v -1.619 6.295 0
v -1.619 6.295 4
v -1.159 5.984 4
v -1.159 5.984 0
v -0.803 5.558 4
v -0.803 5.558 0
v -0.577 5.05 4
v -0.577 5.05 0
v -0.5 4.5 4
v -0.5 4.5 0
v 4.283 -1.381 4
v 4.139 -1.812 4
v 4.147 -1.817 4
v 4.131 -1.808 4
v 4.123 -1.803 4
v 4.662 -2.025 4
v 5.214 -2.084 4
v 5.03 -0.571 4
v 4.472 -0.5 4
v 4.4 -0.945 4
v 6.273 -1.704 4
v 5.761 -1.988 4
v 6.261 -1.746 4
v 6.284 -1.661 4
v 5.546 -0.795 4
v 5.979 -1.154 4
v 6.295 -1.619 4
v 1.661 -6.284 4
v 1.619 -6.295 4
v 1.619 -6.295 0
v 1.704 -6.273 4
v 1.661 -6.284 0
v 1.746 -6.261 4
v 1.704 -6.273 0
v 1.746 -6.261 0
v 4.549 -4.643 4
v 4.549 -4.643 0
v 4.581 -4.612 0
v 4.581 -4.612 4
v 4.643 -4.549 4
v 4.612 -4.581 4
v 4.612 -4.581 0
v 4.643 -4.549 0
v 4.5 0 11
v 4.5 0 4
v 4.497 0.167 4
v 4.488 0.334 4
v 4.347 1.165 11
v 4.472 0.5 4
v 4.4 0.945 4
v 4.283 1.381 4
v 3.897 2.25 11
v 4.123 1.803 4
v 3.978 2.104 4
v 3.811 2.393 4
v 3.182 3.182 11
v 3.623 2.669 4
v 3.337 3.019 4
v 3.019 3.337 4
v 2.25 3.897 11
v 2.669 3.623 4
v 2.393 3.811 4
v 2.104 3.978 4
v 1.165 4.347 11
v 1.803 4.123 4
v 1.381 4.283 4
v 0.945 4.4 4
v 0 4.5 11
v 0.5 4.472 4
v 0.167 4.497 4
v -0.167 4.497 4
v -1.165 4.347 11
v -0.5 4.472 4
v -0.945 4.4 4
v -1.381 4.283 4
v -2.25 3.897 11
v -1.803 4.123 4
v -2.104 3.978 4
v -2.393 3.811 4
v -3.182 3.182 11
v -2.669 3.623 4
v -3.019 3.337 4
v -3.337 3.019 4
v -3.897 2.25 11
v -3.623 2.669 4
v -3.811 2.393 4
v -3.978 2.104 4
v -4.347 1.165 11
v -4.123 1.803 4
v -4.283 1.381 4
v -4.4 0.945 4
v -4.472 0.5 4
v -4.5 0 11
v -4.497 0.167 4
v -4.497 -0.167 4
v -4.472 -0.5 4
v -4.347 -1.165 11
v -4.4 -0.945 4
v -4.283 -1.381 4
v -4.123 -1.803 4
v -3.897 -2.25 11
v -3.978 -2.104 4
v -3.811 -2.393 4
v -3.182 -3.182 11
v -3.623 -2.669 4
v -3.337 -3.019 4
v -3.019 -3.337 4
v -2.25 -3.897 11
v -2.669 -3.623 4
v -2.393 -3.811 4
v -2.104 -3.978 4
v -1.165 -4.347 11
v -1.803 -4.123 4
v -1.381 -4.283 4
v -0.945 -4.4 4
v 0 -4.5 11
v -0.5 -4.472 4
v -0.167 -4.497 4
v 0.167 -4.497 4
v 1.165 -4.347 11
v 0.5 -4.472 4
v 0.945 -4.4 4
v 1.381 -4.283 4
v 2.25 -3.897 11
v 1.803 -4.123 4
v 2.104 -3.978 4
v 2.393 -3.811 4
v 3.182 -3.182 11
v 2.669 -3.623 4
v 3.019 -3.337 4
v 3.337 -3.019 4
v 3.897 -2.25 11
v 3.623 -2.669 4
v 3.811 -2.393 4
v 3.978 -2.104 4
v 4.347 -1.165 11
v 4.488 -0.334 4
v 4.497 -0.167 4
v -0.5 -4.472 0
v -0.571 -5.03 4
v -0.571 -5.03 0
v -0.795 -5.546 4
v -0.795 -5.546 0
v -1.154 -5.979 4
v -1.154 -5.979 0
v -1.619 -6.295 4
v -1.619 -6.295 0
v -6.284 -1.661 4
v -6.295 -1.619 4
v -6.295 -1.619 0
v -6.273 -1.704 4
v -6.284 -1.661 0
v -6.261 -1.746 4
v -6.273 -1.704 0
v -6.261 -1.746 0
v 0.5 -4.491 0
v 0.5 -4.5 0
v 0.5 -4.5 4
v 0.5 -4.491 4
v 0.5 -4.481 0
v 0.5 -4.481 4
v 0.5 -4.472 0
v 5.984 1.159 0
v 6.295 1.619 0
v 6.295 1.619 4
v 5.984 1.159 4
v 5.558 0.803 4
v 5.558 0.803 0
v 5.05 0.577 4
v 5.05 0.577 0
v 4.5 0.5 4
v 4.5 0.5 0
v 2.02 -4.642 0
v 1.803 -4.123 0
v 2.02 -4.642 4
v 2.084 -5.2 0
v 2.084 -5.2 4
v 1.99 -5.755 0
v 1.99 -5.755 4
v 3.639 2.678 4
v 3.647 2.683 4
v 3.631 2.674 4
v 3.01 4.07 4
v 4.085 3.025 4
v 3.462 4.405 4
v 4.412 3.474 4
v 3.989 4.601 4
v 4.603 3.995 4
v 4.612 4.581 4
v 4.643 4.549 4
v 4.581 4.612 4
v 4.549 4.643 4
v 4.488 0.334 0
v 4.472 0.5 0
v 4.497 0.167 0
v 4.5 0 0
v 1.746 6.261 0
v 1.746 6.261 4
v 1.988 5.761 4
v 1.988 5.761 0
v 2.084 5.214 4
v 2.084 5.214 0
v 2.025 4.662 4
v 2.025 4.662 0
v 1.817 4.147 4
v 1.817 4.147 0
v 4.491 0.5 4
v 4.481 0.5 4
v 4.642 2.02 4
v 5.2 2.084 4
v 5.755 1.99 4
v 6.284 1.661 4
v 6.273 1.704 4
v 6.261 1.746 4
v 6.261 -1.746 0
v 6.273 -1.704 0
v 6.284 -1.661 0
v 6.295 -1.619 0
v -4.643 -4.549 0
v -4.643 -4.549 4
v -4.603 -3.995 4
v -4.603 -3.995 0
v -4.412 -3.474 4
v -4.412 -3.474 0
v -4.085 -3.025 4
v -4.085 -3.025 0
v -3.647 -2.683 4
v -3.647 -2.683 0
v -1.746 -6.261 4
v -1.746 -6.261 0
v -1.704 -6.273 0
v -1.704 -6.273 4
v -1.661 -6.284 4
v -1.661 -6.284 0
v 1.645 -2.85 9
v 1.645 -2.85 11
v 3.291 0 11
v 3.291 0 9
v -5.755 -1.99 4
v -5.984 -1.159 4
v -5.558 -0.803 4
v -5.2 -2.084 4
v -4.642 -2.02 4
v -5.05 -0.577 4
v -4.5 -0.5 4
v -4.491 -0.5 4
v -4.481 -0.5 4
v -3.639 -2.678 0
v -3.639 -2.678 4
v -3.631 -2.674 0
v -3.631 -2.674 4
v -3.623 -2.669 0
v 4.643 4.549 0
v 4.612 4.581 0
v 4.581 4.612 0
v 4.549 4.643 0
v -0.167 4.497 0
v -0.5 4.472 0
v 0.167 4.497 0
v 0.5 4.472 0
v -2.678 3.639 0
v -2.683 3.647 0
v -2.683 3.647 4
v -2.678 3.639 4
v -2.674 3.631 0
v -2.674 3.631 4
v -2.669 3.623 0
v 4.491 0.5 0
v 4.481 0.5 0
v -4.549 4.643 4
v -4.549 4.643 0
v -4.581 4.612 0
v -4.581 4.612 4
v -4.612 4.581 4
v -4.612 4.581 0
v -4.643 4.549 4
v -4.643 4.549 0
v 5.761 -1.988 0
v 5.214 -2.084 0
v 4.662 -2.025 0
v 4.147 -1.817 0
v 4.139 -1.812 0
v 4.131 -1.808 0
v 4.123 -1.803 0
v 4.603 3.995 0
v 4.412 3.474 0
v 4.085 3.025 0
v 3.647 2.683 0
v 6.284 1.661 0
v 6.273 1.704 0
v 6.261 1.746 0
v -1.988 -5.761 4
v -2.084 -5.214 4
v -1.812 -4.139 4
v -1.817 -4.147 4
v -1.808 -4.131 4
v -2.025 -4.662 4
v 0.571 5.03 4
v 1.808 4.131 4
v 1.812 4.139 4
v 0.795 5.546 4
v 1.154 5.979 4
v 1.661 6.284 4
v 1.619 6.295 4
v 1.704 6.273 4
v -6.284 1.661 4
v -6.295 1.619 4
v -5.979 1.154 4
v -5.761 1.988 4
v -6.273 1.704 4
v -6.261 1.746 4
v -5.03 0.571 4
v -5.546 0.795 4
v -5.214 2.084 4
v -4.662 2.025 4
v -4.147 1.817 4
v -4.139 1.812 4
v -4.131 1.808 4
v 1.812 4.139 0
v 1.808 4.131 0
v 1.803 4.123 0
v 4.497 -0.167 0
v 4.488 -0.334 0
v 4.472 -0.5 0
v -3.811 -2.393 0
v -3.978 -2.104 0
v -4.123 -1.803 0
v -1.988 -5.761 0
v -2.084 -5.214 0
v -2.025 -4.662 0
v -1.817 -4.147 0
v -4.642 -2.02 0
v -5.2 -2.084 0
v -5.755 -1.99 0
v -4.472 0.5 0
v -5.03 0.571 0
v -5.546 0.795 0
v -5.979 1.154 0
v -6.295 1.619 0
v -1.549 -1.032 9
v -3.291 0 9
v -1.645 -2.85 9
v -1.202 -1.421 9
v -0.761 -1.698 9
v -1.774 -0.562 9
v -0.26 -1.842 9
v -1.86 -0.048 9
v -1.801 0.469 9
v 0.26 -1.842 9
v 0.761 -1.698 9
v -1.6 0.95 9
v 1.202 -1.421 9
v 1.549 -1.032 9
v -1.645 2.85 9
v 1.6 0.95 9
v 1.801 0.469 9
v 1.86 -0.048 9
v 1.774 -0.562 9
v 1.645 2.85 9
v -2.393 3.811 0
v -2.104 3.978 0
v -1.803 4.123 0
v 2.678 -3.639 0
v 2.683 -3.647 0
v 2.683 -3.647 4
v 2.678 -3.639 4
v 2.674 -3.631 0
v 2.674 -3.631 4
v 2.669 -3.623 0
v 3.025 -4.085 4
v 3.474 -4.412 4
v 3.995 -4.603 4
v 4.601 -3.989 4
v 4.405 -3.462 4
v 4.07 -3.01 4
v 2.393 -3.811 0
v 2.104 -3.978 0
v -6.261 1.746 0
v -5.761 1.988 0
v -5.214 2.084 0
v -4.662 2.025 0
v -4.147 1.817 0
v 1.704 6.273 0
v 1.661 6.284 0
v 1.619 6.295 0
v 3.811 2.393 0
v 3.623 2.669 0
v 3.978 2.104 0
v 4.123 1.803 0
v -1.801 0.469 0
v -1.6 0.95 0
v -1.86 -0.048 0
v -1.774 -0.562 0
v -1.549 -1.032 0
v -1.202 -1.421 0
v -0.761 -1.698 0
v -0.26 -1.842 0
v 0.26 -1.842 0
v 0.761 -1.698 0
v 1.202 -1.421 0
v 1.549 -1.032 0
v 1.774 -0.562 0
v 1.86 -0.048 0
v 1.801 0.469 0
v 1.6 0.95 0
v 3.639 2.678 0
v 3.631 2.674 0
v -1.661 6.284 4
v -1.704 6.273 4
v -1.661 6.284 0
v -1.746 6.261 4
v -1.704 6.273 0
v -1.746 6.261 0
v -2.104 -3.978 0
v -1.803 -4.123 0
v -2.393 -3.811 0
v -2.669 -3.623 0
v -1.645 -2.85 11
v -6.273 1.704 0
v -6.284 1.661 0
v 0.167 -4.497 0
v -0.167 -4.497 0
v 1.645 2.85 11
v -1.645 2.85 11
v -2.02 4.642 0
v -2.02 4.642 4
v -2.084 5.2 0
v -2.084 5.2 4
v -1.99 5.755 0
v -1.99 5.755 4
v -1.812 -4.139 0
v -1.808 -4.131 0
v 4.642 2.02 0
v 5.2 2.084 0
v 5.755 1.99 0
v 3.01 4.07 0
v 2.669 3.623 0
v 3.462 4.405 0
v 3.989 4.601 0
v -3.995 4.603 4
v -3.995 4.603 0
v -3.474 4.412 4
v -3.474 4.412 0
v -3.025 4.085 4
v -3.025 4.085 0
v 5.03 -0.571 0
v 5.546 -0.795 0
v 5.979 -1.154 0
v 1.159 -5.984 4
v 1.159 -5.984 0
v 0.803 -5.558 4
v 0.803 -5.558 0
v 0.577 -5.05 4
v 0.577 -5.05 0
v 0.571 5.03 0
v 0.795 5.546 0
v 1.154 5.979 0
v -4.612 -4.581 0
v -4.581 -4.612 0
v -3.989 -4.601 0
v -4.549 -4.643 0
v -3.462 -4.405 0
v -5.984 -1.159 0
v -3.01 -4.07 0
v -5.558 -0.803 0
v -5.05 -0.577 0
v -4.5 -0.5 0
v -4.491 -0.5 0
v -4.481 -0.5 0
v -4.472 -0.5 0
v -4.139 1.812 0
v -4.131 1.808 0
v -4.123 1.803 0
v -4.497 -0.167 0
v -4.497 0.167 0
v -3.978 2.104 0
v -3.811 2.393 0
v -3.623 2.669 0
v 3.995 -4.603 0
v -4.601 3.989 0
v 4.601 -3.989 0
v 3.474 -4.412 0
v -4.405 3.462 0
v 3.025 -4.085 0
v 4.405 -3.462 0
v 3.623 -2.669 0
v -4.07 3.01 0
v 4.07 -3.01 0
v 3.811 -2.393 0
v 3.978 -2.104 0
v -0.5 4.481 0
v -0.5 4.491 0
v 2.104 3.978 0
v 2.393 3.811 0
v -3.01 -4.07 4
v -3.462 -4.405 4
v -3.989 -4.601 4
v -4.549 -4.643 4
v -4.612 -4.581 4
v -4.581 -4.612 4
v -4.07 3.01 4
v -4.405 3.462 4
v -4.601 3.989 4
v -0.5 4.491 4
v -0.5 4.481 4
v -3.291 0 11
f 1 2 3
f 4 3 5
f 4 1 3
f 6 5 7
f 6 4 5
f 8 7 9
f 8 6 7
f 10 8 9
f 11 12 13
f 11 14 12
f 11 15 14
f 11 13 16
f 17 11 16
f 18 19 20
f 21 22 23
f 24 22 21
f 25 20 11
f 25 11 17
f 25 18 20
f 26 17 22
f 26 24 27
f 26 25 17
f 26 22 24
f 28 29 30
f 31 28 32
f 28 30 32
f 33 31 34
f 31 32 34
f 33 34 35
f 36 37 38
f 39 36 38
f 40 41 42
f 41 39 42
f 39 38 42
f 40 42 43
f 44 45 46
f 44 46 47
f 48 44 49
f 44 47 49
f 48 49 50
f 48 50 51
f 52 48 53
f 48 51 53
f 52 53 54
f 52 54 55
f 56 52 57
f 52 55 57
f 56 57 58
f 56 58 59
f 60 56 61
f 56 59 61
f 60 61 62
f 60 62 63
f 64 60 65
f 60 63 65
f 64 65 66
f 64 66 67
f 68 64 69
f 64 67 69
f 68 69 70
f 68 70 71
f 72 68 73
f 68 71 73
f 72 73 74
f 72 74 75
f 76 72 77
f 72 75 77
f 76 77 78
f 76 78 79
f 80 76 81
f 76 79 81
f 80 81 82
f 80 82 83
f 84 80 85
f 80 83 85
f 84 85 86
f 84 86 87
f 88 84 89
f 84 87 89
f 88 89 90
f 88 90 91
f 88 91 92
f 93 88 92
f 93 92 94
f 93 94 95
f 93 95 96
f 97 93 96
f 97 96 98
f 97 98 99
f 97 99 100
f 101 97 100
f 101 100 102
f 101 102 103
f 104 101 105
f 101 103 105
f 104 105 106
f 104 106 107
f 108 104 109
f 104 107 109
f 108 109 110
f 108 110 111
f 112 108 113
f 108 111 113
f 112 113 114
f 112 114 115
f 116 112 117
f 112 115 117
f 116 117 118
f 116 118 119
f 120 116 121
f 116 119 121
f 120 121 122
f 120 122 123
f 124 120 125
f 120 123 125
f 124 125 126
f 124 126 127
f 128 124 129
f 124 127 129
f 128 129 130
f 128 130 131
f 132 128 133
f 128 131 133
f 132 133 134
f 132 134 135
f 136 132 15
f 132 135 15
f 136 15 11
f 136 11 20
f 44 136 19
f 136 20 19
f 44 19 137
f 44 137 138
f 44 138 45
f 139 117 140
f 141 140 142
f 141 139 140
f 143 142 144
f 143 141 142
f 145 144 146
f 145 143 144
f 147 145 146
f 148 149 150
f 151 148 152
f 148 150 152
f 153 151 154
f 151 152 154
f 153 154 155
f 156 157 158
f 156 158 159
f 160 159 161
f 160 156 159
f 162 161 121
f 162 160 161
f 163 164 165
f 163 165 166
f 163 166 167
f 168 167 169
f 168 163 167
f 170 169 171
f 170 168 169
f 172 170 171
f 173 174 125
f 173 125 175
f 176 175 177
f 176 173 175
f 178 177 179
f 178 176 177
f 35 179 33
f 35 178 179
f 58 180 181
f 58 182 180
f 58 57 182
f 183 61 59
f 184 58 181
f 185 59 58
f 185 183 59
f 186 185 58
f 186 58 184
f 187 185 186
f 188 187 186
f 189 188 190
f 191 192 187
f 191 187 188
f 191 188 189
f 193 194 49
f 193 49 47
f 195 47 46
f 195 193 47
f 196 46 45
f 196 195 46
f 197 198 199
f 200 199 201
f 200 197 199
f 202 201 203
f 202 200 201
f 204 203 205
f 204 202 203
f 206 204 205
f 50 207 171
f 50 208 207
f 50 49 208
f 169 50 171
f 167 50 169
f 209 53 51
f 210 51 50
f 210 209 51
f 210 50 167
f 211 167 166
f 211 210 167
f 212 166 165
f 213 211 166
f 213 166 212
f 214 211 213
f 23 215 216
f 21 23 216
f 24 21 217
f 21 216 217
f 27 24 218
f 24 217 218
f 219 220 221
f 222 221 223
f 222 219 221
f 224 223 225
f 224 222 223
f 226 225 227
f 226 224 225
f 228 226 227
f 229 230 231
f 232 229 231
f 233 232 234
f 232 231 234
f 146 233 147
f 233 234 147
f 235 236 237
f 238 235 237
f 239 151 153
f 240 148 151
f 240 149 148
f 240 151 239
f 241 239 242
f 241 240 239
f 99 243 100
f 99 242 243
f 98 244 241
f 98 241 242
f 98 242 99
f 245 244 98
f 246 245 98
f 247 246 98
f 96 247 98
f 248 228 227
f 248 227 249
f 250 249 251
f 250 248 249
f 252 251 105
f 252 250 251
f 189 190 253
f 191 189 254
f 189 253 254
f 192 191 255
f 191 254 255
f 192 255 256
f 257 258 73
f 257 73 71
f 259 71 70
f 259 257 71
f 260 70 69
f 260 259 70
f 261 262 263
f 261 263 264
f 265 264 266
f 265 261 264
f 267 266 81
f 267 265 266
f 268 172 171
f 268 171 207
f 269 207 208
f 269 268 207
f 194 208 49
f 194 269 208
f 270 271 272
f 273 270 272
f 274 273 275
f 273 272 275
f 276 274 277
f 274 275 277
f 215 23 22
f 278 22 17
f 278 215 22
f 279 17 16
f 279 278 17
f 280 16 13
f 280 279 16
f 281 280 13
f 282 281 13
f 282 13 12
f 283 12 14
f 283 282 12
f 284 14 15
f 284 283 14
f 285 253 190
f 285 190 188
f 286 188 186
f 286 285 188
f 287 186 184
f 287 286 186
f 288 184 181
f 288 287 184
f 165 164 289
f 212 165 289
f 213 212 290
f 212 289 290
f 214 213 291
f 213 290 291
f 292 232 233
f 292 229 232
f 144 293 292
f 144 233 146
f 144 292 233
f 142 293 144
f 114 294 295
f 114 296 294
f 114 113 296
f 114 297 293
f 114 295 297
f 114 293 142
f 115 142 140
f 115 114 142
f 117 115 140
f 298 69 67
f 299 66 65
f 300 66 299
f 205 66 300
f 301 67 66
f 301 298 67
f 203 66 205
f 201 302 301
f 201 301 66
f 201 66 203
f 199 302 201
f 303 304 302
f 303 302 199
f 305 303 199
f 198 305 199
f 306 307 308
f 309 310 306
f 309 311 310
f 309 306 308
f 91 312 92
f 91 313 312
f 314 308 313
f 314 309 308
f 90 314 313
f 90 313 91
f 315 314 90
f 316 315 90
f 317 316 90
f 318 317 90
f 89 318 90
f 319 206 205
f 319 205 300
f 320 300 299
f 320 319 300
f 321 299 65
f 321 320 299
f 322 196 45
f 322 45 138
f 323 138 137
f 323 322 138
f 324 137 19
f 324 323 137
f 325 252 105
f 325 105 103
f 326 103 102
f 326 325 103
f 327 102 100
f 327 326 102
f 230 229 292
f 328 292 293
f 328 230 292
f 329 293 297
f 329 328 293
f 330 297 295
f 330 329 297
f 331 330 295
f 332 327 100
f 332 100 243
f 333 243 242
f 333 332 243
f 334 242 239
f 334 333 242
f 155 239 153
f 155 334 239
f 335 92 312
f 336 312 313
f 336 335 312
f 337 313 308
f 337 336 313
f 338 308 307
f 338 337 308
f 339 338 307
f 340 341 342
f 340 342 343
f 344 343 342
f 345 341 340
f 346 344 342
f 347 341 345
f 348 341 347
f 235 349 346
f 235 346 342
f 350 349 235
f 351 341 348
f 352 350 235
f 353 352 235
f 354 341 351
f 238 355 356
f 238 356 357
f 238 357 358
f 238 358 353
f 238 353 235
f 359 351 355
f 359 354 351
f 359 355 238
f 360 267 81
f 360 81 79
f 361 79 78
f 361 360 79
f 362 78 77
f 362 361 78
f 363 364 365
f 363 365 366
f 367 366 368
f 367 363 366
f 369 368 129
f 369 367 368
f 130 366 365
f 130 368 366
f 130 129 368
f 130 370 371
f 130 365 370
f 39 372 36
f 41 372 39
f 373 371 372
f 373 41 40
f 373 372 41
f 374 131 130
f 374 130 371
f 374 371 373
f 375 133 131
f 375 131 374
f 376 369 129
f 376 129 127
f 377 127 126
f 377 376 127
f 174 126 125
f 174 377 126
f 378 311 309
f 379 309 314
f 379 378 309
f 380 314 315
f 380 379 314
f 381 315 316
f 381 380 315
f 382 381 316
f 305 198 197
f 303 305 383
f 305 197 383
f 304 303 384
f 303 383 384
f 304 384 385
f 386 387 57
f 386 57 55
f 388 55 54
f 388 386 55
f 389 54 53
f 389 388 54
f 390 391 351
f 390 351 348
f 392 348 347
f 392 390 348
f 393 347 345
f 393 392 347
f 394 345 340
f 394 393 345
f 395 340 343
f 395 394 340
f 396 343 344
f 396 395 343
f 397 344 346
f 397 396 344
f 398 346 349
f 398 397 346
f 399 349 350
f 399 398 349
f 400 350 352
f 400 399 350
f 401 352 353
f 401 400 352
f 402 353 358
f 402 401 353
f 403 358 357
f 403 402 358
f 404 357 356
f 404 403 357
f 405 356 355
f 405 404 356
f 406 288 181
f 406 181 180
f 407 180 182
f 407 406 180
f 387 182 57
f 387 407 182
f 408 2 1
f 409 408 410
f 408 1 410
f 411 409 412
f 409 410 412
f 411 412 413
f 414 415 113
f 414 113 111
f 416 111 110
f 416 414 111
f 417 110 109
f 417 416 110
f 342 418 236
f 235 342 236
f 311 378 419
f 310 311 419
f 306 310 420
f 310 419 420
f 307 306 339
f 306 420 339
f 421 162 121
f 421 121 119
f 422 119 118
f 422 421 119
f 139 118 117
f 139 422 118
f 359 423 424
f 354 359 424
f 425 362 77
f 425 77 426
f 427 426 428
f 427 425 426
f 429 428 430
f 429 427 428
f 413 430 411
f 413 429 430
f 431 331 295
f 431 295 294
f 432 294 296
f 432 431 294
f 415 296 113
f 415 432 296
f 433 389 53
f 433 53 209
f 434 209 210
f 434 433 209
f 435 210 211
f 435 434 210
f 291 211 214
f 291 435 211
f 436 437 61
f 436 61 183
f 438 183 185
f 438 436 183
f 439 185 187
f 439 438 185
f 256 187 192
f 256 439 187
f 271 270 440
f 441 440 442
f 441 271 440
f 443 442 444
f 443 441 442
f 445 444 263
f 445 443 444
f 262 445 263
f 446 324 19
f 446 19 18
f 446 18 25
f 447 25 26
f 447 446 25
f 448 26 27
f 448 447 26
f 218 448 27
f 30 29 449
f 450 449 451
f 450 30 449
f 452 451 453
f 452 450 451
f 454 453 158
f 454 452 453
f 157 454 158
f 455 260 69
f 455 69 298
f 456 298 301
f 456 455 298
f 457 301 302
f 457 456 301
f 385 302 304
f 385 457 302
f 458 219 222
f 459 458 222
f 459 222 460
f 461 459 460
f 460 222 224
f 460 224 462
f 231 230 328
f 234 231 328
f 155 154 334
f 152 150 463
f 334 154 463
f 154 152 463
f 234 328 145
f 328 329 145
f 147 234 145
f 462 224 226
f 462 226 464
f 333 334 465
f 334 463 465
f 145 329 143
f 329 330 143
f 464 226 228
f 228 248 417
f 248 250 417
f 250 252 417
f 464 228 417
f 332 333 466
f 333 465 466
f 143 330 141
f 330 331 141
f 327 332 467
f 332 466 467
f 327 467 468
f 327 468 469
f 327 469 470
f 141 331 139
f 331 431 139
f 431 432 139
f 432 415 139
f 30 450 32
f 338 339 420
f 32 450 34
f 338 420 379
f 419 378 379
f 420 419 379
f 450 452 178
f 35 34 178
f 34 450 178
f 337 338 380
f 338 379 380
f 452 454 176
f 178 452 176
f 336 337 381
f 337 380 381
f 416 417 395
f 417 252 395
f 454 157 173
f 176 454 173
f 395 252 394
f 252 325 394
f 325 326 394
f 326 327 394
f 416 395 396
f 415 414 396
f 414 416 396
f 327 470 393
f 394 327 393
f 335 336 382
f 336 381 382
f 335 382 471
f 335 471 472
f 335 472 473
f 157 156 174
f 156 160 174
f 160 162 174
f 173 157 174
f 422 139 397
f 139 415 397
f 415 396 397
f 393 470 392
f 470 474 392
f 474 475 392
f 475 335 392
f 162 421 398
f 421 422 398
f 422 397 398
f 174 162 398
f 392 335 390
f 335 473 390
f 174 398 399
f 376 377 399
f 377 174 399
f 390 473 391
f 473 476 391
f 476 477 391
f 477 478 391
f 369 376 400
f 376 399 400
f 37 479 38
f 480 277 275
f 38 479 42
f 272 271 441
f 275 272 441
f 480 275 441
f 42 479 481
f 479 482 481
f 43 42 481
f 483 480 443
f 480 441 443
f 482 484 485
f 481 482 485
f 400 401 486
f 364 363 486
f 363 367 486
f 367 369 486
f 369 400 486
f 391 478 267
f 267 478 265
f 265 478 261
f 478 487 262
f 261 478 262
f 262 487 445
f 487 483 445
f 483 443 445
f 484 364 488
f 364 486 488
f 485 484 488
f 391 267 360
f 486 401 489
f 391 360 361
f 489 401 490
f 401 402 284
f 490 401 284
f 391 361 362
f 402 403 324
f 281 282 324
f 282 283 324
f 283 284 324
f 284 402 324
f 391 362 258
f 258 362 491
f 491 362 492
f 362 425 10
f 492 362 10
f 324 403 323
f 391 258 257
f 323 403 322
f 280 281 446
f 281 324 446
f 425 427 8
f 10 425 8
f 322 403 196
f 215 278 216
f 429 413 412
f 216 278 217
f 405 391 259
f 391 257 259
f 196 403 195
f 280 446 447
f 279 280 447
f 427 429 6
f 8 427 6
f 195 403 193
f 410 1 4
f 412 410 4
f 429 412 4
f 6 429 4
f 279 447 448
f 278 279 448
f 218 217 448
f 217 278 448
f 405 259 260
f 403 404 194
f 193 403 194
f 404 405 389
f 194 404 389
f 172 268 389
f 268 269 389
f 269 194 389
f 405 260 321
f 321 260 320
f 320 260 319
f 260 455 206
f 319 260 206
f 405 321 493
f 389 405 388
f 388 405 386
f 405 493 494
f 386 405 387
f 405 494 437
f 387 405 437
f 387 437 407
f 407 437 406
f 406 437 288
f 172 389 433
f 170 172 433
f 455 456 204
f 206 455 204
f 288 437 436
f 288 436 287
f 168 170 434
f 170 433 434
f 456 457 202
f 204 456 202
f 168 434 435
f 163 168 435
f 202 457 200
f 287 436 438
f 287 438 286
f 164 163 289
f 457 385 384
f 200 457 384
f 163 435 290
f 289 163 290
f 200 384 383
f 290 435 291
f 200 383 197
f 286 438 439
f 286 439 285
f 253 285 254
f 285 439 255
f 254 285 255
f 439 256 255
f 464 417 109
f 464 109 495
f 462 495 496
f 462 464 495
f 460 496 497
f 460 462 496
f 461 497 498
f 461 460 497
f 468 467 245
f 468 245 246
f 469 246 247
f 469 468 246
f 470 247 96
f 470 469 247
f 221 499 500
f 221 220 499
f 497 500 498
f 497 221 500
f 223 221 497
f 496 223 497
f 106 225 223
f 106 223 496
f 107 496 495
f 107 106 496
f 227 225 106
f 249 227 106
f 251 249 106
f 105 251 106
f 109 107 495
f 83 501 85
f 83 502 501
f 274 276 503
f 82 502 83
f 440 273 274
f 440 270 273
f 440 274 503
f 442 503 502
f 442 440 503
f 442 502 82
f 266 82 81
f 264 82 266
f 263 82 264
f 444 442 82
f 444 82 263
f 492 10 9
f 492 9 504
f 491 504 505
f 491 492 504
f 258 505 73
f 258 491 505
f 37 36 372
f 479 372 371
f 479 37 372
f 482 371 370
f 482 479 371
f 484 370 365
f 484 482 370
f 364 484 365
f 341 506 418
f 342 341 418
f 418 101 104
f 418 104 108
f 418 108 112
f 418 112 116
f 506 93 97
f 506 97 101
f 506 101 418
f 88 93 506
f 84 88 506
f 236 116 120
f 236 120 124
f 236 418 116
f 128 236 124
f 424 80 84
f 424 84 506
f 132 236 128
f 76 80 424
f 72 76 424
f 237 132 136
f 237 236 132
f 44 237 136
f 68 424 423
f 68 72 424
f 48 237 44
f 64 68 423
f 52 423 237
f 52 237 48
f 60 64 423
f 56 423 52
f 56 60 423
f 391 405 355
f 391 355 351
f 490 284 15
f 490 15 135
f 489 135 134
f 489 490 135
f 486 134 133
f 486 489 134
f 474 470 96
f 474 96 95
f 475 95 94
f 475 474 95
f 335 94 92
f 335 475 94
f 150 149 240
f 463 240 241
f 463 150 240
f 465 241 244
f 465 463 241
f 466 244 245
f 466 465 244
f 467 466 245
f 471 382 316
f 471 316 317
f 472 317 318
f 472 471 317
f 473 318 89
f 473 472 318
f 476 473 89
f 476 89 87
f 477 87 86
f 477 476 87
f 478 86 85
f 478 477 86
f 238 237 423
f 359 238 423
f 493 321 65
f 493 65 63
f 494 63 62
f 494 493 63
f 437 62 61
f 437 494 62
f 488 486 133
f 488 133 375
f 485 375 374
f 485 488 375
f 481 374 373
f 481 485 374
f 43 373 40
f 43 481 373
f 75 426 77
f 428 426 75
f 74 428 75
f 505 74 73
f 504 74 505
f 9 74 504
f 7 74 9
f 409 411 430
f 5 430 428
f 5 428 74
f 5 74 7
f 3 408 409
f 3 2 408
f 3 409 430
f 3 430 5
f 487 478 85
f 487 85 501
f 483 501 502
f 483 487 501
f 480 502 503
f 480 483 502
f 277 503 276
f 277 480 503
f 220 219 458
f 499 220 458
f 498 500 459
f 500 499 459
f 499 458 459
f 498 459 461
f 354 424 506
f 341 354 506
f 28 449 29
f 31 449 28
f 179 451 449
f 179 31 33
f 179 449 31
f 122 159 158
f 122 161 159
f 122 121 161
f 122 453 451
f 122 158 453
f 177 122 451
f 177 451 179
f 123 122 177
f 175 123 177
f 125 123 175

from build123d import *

# Parameters (mm, degrees)
SKETCH1_R           = 6.5
SKETCH1_R_2         = 1
BOSS_EXTRUDE1_DEPTH = 4
CUT_EXTRUDE2_DEPTH  = 11.024968828
CIRPATTERN2_COUNT   = 12
SKETCH11_R          = 4.5
BOSS_EXTRUDE2_DEPTH = 11
CUT_EXTRUDE3_START  = 11
CUT_EXTRUDE3_DEPTH  = 2
CUT_EXTRUDE4_DEPTH  = 15.151353444


with BuildPart() as part:
    # Sketch1 → Boss-Extrude1 (new body)
    with BuildSketch(Plane.XY):
        Circle(SKETCH1_R)
        Circle(SKETCH1_R_2, mode=Mode.SUBTRACT)
    extrude(amount=BOSS_EXTRUDE1_DEPTH)

    # Sketch4 → Cut-Extrude2 (cut, through all)
    with BuildSketch(Plane.XY):
        with BuildLine():
            ThreePointArc((-0.500194414, 4.472114215), (0, 4.5), (0.500194414, 4.472114215))
            ThreePointArc((0.500194414, 4.472114215), (1.113314535, 5.941215952), (2.604960982, 6.497243899))
            ThreePointArc((2.604960982, 6.497243899), (0, 7), (-2.604960982, 6.497243899))
            ThreePointArc((-2.604960982, 6.497243899), (-1.123395838, 5.950848366), (-0.5, 4.5))
            ThreePointArc((-0.5, 4.5), (-0.500048604, 4.486056768), (-0.500194414, 4.472114215))
        make_face()
    cut_extrude2 = extrude(amount=CUT_EXTRUDE2_DEPTH, mode=Mode.SUBTRACT)

    # CirPattern2: Cut-Extrude2 ×12 about axis
    cirpattern2_axis = Axis((0, 0, 4), (0, 0, -1))
    for i in range(1, CIRPATTERN2_COUNT):
        add(cut_extrude2.rotate(cirpattern2_axis, i * 360 / CIRPATTERN2_COUNT), mode=Mode.SUBTRACT)

    # Sketch11 → Boss-Extrude2 (add)
    with BuildSketch(Plane.XY):
        Circle(SKETCH11_R)
    extrude(amount=BOSS_EXTRUDE2_DEPTH)

    # Sketch12 → Cut-Extrude3 (cut)
    with BuildSketch(Plane.XY.offset(CUT_EXTRUDE3_START)):
        Polygon((3.290896534, 0), (1.645448267, 2.85), (-1.645448267, 2.85), (-3.290896534, 0), (-1.645448267, -2.85), (1.645448267, -2.85), align=None)
    extrude(amount=-CUT_EXTRUDE3_DEPTH, mode=Mode.SUBTRACT)

    # Sketch13 → Cut-Extrude4 (cut, through all)
    with BuildSketch(Plane.XY):
        with BuildLine():
            ThreePointArc((-1.6, 0.95), (0, -1.860779407), (1.6, 0.95))
            Line((1.6, 0.95), (-1.6, 0.95))
        make_face()
    extrude(amount=CUT_EXTRUDE4_DEPTH, mode=Mode.SUBTRACT)


solid = part.part
